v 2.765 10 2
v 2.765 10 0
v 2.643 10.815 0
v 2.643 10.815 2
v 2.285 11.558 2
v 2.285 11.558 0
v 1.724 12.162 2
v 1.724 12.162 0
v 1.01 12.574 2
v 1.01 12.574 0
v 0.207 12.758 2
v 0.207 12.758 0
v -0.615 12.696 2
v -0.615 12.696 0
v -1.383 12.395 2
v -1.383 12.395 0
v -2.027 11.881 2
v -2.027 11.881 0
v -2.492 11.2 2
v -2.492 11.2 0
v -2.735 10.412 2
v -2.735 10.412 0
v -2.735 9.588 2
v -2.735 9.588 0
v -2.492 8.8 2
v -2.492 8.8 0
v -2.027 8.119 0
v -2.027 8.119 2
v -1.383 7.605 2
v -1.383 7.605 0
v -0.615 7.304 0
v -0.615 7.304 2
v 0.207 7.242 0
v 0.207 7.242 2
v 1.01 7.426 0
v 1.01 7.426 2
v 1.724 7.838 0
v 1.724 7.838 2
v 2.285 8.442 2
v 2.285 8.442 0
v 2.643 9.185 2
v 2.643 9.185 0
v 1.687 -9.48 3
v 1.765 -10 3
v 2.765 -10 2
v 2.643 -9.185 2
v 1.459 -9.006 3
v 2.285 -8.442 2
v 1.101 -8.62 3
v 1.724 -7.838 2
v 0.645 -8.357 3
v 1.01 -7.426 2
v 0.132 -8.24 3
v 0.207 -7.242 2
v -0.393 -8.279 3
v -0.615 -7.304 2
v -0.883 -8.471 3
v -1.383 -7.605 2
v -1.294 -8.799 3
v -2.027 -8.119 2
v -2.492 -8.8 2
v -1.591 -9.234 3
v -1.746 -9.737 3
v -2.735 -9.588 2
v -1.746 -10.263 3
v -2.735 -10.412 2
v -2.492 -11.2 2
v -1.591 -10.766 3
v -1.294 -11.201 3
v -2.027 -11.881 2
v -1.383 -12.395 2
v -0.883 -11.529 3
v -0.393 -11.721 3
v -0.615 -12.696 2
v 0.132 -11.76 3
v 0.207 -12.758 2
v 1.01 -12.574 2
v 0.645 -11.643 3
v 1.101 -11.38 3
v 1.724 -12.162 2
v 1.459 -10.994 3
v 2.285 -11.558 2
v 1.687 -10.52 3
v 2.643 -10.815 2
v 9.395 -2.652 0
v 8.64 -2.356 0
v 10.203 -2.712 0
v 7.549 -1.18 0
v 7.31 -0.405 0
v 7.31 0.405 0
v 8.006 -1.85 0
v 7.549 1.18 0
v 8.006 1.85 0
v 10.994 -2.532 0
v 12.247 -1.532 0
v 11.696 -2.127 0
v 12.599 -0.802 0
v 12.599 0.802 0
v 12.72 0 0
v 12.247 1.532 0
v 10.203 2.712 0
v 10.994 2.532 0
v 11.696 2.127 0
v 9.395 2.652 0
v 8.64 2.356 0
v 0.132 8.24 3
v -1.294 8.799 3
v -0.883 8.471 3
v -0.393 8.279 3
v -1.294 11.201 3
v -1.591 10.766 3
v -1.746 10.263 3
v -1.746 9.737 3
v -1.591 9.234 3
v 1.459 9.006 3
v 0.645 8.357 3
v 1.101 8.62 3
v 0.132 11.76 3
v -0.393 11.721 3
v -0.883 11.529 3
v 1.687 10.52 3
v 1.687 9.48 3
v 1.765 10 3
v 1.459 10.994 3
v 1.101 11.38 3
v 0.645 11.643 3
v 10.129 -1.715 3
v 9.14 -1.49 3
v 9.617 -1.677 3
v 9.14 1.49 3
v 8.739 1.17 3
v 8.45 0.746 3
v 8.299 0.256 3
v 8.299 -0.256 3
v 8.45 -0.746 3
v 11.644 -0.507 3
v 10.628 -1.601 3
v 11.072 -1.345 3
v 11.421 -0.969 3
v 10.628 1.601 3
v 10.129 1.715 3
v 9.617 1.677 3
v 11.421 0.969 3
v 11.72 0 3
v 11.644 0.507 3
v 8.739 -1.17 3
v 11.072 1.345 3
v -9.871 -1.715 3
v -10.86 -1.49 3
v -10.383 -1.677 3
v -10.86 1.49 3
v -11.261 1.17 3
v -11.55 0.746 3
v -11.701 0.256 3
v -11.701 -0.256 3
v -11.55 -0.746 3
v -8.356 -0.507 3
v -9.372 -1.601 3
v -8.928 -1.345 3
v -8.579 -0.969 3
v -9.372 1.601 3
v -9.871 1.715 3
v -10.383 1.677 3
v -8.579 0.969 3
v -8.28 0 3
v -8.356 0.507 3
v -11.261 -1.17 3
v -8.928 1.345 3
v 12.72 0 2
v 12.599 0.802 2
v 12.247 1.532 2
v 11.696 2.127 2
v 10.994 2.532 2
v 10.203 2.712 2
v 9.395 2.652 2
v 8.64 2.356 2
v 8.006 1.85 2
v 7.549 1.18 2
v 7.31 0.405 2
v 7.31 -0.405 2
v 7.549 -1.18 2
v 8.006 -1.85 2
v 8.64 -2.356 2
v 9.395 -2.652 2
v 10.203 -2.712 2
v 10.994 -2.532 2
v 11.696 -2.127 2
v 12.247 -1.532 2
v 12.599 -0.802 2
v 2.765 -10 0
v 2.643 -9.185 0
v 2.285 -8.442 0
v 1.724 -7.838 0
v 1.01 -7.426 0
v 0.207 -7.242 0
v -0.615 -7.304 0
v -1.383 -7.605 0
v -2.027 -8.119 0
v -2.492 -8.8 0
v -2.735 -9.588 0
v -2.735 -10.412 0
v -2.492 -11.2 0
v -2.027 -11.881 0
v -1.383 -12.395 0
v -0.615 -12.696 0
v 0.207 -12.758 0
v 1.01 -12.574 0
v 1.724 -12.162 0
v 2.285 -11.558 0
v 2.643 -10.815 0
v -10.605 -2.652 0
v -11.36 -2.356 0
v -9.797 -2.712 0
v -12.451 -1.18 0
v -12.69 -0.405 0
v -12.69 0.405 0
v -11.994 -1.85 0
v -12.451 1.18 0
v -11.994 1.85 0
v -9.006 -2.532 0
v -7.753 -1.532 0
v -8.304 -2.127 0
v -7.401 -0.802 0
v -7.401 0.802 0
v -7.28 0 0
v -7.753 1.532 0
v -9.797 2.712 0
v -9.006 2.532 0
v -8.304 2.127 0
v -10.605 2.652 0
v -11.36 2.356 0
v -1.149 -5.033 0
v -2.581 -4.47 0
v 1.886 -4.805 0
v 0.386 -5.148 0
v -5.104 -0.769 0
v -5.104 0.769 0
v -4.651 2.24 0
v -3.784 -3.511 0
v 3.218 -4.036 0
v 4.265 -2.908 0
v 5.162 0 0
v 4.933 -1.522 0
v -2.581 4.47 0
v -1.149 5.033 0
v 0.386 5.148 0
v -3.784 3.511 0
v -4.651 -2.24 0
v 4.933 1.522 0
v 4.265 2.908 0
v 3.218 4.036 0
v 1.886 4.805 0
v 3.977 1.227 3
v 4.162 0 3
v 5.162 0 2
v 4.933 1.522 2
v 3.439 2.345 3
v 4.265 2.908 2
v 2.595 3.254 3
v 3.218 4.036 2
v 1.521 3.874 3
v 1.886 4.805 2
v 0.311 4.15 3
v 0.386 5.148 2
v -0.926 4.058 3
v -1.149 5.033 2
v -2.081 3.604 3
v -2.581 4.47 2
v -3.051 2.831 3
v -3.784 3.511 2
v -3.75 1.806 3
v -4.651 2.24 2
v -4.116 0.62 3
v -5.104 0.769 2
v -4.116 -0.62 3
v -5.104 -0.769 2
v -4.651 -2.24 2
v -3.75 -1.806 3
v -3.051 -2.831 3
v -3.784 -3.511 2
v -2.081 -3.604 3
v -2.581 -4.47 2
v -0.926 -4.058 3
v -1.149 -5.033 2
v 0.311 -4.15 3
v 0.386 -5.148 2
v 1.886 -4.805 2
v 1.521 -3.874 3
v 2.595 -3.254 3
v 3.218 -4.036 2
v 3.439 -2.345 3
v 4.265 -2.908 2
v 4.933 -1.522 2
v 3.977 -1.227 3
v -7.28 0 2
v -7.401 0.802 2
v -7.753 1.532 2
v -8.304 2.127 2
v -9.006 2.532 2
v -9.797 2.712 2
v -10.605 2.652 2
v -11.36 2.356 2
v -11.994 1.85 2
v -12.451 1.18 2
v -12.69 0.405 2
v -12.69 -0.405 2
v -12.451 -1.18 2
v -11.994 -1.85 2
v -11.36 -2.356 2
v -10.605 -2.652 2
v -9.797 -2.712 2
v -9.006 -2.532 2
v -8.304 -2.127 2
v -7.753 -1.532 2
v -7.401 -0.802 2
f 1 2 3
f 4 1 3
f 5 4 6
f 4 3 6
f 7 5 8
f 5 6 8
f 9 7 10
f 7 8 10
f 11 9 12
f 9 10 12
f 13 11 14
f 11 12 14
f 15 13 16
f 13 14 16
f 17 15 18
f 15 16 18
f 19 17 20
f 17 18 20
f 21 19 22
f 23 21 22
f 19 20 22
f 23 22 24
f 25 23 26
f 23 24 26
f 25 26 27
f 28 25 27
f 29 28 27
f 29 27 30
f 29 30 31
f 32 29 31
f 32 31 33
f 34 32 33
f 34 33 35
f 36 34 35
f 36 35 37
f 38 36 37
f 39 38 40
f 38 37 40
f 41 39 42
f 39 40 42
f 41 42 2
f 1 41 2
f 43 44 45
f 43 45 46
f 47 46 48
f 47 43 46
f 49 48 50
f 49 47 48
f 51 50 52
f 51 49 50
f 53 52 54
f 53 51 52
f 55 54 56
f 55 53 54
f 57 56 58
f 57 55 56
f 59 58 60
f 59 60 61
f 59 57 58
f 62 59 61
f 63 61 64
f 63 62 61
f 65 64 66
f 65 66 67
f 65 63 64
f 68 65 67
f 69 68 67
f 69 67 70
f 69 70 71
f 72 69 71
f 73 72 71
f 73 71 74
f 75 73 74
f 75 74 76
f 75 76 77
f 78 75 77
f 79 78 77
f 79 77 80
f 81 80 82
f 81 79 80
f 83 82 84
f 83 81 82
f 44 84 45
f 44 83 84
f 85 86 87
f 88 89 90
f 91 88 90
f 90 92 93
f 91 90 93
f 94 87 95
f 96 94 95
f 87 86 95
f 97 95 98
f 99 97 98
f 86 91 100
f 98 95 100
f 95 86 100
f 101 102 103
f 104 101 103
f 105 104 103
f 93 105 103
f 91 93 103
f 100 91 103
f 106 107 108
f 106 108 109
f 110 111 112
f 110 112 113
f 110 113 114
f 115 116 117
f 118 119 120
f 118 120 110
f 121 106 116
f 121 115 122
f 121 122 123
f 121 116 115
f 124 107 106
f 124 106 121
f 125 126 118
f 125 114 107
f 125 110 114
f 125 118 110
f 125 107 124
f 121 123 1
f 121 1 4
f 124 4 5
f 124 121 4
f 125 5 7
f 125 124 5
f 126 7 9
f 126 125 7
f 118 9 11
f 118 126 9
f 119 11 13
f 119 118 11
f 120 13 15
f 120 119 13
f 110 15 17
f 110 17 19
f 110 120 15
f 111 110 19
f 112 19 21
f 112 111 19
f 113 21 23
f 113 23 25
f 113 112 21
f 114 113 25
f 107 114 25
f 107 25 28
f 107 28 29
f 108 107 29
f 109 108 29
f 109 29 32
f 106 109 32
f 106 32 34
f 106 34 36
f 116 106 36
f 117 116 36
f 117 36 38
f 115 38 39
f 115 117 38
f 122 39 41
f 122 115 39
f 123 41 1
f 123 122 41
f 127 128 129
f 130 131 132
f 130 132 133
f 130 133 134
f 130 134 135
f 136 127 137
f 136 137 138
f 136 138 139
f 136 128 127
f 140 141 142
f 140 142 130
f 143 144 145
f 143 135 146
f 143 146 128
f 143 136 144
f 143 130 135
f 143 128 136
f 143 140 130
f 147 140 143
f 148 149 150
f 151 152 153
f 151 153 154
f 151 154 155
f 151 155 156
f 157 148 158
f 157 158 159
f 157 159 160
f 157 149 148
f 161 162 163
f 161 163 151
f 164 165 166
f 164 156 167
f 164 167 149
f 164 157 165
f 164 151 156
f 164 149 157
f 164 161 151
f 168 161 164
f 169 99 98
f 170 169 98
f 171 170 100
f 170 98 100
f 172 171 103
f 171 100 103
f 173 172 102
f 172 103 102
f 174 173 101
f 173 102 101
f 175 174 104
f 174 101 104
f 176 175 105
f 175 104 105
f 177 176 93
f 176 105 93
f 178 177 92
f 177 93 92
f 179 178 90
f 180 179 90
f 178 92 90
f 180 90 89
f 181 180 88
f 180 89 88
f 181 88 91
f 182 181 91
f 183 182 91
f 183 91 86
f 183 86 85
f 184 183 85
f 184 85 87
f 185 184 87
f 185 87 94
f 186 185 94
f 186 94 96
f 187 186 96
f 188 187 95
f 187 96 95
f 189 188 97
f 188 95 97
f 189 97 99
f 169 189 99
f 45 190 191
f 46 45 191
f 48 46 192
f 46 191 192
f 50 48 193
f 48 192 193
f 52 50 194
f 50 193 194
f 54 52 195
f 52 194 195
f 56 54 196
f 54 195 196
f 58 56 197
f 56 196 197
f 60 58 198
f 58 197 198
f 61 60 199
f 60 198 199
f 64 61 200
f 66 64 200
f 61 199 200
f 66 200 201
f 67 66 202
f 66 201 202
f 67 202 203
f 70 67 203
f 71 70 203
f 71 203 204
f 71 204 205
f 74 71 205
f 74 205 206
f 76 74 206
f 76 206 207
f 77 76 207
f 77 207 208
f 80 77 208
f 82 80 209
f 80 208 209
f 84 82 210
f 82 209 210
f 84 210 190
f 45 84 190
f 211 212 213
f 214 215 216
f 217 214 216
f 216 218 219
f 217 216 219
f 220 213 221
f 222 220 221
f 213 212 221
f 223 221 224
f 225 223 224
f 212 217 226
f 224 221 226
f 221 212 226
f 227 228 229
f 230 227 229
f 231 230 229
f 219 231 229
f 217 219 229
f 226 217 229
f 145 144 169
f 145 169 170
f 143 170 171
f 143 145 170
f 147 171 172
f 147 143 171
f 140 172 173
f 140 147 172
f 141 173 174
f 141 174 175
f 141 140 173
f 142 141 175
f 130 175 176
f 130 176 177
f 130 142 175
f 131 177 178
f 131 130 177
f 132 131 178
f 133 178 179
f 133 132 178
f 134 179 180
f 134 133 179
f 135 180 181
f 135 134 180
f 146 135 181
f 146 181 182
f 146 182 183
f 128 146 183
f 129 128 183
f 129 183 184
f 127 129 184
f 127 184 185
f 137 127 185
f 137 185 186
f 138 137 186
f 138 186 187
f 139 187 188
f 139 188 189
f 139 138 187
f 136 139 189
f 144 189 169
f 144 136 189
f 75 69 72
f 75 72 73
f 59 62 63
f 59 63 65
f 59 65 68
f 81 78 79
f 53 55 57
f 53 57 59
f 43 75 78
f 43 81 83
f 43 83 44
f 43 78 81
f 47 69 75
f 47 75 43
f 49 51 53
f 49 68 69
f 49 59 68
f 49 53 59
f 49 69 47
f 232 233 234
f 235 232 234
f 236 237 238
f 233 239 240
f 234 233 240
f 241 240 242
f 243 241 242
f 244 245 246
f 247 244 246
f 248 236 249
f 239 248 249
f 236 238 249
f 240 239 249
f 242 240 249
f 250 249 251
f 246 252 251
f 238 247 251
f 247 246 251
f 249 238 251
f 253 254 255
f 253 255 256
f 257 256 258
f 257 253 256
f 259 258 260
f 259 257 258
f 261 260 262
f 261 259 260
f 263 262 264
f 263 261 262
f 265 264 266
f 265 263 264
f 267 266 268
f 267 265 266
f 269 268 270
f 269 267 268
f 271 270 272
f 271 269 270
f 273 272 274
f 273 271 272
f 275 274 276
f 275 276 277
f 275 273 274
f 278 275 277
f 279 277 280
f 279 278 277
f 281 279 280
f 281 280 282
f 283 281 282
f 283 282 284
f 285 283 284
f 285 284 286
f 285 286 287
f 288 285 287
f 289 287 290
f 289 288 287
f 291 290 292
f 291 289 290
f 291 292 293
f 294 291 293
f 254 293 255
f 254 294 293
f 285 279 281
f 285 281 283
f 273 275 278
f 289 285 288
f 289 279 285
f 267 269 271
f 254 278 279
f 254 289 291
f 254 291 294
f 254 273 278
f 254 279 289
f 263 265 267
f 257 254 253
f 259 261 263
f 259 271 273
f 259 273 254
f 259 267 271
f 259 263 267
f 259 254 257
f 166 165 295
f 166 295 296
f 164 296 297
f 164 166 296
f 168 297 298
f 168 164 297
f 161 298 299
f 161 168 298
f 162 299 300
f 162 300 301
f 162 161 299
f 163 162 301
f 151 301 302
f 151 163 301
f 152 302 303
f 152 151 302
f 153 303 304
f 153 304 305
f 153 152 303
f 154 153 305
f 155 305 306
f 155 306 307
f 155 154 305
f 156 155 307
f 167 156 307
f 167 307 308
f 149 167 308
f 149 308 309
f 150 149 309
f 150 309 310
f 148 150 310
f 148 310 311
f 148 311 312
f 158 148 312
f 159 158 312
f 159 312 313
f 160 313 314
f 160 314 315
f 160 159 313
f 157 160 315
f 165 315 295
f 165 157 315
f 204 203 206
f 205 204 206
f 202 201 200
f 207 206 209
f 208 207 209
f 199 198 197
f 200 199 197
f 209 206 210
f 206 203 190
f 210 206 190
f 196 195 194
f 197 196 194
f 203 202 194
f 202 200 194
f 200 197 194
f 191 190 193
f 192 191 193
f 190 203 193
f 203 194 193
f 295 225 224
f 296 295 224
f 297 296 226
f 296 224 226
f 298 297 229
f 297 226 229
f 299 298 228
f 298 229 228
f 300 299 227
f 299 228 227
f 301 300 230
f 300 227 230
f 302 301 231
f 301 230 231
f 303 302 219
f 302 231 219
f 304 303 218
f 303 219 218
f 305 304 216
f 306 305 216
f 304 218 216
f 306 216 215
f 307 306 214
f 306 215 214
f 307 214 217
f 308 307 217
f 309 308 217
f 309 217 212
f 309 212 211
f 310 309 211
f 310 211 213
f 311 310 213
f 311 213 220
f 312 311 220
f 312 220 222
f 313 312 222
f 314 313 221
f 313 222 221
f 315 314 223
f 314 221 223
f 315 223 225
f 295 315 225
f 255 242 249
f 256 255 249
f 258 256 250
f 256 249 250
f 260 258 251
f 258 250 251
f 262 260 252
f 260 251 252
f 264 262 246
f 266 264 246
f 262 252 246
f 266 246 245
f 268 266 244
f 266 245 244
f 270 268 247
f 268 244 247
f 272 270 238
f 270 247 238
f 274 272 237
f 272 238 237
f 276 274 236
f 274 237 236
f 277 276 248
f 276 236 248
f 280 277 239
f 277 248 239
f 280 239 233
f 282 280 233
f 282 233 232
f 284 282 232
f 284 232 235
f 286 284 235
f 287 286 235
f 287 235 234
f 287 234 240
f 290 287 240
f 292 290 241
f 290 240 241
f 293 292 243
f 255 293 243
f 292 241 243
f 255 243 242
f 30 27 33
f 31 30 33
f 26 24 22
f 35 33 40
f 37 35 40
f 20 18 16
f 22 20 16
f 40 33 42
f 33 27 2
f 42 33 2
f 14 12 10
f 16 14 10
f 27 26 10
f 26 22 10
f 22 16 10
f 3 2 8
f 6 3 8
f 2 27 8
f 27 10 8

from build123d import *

# Parameters (mm, degrees)
SKETCH1_R             = 5.162028718
BOSS_EXTRUDE1_DEPTH   = 3
SKETCH1_R_2           = 2.765423897
BOSS_EXTRUDE1_2_DEPTH = 3
BOSS_EXTRUDE1_3_DEPTH = 3
SKETCH1_R_3           = 2.719930831
BOSS_EXTRUDE1_4_DEPTH = 3
BOSS_EXTRUDE1_5_DEPTH = 3
CHAMFER2_SIZE         = 1
CHAMFER3_SIZE         = 1
CHAMFER4_SIZE         = 1
CHAMFER5_SIZE         = 1
CHAMFER6_SIZE         = 1


with BuildPart() as part:
    # Sketch1 → Boss-Extrude1 (new body)
    with BuildSketch(Plane.XY):
        Circle(SKETCH1_R)
    extrude(amount=BOSS_EXTRUDE1_DEPTH)

    # Chamfer6
    chamfer6_edges = [part.edges().sort_by_distance(p)[0] for p in [
        (-5.162028718, 0, 3),
    ]]
    chamfer(chamfer6_edges, length=CHAMFER6_SIZE)


with BuildPart() as body_2:
    # Sketch1 → Boss-Extrude1 2 (new body)
    with BuildSketch(Plane.XY):
        with Locations((0, 10)):
            Circle(SKETCH1_R_2)
    extrude(amount=BOSS_EXTRUDE1_2_DEPTH)

    # Chamfer2
    chamfer2_edges = [body_2.edges().sort_by_distance(p)[0] for p in [
        (-2.765423897, 10, 3),
    ]]
    chamfer(chamfer2_edges, length=CHAMFER2_SIZE)


with BuildPart() as body_3:
    # Sketch1 → Boss-Extrude1 3 (new body)
    with BuildSketch(Plane.XY):
        with Locations((0, -10)):
            Circle(SKETCH1_R_2)
    extrude(amount=BOSS_EXTRUDE1_3_DEPTH)

    # Chamfer5
    chamfer5_edges = [body_3.edges().sort_by_distance(p)[0] for p in [
        (-2.765423897, -10, 3),
    ]]
    chamfer(chamfer5_edges, length=CHAMFER5_SIZE)


with BuildPart() as body_4:
    # Sketch1 → Boss-Extrude1 4 (new body)
    with BuildSketch(Plane.XY):
        with Locations((-10, 0)):
            Circle(SKETCH1_R_3)
    extrude(amount=BOSS_EXTRUDE1_4_DEPTH)

    # Chamfer4
    chamfer4_edges = [body_4.edges().sort_by_distance(p)[0] for p in [
        (-12.719930831, 0, 3),
    ]]
    chamfer(chamfer4_edges, length=CHAMFER4_SIZE)


with BuildPart() as body_5:
    # Sketch1 → Boss-Extrude1 5 (new body)
    with BuildSketch(Plane.XY):
        with Locations((10, 0)):
            Circle(SKETCH1_R_3)
    extrude(amount=BOSS_EXTRUDE1_5_DEPTH)

    # Chamfer3
    chamfer3_edges = [body_5.edges().sort_by_distance(p)[0] for p in [
        (7.280069169, 0, 3),
    ]]
    chamfer(chamfer3_edges, length=CHAMFER3_SIZE)


solid = Compound([part.part, body_2.part, body_3.part, body_4.part, body_5.part])
